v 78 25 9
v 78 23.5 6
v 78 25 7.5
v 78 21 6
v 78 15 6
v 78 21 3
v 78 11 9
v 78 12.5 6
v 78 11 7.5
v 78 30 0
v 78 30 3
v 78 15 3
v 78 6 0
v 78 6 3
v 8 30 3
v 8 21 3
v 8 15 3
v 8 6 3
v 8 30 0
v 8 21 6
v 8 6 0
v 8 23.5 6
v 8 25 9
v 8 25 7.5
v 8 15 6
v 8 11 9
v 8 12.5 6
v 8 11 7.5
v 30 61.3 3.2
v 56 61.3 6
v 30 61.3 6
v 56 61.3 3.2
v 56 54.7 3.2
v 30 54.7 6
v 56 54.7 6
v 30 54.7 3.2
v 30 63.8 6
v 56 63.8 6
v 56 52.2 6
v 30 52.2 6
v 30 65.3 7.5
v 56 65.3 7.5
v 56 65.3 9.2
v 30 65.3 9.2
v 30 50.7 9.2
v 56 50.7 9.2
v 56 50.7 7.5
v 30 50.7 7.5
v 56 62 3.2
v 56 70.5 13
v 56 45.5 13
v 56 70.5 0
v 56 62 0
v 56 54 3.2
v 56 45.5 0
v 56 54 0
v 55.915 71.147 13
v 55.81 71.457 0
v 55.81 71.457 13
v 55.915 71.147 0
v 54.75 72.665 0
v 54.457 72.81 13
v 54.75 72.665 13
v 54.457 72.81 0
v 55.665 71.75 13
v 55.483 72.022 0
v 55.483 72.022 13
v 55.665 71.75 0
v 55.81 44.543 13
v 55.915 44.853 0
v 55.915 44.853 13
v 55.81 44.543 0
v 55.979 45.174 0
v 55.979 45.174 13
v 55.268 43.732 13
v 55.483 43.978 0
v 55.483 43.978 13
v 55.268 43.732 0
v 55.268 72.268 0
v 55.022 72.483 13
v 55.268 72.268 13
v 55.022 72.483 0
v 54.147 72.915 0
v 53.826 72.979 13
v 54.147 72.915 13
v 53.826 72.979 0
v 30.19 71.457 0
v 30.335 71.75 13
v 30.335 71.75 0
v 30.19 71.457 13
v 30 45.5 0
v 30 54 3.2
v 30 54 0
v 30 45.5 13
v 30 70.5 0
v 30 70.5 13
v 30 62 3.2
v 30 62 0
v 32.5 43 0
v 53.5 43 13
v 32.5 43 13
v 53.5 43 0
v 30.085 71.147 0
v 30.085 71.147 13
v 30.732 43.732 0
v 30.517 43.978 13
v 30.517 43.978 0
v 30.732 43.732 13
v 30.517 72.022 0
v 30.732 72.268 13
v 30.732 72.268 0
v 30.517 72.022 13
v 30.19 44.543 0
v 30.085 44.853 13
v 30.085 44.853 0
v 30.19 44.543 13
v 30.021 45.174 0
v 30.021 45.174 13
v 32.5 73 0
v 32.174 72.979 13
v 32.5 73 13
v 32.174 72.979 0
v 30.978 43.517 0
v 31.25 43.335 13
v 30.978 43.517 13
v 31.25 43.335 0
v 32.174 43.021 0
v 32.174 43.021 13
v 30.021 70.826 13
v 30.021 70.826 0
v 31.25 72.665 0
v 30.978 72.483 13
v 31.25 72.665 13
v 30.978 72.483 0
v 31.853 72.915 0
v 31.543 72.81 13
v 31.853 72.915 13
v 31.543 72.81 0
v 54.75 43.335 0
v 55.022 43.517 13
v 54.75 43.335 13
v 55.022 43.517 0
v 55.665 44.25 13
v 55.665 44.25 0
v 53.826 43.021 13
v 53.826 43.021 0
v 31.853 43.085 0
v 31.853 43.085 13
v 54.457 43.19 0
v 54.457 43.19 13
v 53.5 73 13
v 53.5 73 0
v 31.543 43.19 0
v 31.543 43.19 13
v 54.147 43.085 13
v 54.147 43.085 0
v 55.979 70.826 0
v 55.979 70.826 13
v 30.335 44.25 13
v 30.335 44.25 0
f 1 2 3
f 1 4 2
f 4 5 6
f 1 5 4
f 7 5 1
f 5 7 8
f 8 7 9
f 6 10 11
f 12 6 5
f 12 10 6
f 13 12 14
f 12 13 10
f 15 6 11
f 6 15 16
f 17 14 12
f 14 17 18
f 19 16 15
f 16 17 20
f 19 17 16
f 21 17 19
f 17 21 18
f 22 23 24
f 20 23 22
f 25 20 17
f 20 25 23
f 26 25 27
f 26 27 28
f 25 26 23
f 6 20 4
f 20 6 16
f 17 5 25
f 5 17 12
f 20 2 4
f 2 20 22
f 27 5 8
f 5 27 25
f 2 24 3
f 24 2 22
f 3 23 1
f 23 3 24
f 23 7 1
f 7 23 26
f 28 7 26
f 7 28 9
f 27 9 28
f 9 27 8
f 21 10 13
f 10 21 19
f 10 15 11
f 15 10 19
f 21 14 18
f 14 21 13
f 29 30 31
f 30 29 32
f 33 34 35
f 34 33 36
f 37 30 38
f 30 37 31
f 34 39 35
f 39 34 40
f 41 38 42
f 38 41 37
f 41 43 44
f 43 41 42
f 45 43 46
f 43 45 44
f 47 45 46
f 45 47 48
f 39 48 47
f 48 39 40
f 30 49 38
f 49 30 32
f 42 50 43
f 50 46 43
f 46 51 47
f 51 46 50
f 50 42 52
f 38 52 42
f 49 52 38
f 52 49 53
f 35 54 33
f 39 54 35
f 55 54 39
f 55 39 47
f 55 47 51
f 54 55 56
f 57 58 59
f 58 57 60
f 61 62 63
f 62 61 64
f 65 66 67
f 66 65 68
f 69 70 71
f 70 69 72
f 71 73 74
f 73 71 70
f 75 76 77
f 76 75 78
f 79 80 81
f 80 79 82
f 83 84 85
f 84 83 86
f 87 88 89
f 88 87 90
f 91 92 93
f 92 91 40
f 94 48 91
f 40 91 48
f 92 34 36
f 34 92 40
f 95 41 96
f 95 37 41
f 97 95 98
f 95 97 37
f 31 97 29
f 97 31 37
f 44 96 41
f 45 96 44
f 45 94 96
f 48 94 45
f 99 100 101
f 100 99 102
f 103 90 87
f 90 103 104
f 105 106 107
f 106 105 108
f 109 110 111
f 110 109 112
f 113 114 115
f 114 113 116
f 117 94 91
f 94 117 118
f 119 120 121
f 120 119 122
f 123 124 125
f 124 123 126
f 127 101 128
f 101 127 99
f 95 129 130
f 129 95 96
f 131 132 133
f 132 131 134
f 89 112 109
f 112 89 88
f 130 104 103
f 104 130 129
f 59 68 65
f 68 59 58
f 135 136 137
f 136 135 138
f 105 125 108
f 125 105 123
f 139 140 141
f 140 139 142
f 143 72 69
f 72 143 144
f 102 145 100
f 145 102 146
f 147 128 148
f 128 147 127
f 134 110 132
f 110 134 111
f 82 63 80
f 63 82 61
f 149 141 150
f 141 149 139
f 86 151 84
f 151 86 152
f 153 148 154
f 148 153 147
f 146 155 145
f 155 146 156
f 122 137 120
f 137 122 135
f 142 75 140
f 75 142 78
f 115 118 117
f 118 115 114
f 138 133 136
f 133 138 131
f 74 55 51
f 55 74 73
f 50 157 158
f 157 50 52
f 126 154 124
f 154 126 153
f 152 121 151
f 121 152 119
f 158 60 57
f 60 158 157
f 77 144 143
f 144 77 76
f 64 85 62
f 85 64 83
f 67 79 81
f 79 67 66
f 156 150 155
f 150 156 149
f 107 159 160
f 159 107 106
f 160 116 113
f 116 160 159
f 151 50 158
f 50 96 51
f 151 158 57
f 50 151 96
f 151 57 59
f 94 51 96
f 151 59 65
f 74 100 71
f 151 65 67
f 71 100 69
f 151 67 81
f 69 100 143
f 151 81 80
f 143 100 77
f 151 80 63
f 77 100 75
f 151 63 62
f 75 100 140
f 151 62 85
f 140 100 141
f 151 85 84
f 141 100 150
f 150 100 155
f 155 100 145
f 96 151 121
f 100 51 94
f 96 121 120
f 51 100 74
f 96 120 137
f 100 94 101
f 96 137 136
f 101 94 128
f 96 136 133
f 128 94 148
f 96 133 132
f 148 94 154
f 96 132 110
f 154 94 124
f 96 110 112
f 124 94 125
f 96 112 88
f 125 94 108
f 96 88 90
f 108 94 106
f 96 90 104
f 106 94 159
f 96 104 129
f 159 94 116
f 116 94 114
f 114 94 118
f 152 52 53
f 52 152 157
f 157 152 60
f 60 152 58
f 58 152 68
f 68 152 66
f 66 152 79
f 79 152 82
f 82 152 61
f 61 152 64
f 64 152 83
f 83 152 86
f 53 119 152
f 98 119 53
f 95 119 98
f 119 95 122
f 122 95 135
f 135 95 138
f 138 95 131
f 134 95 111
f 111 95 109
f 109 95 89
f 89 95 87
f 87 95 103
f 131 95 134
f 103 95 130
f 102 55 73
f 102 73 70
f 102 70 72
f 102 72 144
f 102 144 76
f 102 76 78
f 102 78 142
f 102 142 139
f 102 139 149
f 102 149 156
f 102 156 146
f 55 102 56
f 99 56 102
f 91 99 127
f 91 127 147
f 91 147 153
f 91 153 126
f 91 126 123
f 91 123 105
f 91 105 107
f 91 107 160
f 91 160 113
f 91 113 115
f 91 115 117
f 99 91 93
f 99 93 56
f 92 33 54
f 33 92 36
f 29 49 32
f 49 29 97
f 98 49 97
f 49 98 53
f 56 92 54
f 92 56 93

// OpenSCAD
/*
Sample 090: Pilzkopf-/T-Linearführung — 0,30 mm
Generated from the FDM Mechanical Sample Library.
Units: millimetres.

Override examples:
  openscad -o custom.stl -D 'view="plate"' -D 'render_fn=64' model.scad
  openscad -o preview.png -D 'view="assembly"' model.scad
*/
use <../../../library/fdm_mechanisms.scad>

render_fn = is_undef(render_fn) ? 48 : render_fn;
view = is_undef(view) ? "plate" : view;
$fn = render_fn;

sample_t_rail(
    view=view,
    clearance=0.3,
    length=70,
    carriage_l=26
);
